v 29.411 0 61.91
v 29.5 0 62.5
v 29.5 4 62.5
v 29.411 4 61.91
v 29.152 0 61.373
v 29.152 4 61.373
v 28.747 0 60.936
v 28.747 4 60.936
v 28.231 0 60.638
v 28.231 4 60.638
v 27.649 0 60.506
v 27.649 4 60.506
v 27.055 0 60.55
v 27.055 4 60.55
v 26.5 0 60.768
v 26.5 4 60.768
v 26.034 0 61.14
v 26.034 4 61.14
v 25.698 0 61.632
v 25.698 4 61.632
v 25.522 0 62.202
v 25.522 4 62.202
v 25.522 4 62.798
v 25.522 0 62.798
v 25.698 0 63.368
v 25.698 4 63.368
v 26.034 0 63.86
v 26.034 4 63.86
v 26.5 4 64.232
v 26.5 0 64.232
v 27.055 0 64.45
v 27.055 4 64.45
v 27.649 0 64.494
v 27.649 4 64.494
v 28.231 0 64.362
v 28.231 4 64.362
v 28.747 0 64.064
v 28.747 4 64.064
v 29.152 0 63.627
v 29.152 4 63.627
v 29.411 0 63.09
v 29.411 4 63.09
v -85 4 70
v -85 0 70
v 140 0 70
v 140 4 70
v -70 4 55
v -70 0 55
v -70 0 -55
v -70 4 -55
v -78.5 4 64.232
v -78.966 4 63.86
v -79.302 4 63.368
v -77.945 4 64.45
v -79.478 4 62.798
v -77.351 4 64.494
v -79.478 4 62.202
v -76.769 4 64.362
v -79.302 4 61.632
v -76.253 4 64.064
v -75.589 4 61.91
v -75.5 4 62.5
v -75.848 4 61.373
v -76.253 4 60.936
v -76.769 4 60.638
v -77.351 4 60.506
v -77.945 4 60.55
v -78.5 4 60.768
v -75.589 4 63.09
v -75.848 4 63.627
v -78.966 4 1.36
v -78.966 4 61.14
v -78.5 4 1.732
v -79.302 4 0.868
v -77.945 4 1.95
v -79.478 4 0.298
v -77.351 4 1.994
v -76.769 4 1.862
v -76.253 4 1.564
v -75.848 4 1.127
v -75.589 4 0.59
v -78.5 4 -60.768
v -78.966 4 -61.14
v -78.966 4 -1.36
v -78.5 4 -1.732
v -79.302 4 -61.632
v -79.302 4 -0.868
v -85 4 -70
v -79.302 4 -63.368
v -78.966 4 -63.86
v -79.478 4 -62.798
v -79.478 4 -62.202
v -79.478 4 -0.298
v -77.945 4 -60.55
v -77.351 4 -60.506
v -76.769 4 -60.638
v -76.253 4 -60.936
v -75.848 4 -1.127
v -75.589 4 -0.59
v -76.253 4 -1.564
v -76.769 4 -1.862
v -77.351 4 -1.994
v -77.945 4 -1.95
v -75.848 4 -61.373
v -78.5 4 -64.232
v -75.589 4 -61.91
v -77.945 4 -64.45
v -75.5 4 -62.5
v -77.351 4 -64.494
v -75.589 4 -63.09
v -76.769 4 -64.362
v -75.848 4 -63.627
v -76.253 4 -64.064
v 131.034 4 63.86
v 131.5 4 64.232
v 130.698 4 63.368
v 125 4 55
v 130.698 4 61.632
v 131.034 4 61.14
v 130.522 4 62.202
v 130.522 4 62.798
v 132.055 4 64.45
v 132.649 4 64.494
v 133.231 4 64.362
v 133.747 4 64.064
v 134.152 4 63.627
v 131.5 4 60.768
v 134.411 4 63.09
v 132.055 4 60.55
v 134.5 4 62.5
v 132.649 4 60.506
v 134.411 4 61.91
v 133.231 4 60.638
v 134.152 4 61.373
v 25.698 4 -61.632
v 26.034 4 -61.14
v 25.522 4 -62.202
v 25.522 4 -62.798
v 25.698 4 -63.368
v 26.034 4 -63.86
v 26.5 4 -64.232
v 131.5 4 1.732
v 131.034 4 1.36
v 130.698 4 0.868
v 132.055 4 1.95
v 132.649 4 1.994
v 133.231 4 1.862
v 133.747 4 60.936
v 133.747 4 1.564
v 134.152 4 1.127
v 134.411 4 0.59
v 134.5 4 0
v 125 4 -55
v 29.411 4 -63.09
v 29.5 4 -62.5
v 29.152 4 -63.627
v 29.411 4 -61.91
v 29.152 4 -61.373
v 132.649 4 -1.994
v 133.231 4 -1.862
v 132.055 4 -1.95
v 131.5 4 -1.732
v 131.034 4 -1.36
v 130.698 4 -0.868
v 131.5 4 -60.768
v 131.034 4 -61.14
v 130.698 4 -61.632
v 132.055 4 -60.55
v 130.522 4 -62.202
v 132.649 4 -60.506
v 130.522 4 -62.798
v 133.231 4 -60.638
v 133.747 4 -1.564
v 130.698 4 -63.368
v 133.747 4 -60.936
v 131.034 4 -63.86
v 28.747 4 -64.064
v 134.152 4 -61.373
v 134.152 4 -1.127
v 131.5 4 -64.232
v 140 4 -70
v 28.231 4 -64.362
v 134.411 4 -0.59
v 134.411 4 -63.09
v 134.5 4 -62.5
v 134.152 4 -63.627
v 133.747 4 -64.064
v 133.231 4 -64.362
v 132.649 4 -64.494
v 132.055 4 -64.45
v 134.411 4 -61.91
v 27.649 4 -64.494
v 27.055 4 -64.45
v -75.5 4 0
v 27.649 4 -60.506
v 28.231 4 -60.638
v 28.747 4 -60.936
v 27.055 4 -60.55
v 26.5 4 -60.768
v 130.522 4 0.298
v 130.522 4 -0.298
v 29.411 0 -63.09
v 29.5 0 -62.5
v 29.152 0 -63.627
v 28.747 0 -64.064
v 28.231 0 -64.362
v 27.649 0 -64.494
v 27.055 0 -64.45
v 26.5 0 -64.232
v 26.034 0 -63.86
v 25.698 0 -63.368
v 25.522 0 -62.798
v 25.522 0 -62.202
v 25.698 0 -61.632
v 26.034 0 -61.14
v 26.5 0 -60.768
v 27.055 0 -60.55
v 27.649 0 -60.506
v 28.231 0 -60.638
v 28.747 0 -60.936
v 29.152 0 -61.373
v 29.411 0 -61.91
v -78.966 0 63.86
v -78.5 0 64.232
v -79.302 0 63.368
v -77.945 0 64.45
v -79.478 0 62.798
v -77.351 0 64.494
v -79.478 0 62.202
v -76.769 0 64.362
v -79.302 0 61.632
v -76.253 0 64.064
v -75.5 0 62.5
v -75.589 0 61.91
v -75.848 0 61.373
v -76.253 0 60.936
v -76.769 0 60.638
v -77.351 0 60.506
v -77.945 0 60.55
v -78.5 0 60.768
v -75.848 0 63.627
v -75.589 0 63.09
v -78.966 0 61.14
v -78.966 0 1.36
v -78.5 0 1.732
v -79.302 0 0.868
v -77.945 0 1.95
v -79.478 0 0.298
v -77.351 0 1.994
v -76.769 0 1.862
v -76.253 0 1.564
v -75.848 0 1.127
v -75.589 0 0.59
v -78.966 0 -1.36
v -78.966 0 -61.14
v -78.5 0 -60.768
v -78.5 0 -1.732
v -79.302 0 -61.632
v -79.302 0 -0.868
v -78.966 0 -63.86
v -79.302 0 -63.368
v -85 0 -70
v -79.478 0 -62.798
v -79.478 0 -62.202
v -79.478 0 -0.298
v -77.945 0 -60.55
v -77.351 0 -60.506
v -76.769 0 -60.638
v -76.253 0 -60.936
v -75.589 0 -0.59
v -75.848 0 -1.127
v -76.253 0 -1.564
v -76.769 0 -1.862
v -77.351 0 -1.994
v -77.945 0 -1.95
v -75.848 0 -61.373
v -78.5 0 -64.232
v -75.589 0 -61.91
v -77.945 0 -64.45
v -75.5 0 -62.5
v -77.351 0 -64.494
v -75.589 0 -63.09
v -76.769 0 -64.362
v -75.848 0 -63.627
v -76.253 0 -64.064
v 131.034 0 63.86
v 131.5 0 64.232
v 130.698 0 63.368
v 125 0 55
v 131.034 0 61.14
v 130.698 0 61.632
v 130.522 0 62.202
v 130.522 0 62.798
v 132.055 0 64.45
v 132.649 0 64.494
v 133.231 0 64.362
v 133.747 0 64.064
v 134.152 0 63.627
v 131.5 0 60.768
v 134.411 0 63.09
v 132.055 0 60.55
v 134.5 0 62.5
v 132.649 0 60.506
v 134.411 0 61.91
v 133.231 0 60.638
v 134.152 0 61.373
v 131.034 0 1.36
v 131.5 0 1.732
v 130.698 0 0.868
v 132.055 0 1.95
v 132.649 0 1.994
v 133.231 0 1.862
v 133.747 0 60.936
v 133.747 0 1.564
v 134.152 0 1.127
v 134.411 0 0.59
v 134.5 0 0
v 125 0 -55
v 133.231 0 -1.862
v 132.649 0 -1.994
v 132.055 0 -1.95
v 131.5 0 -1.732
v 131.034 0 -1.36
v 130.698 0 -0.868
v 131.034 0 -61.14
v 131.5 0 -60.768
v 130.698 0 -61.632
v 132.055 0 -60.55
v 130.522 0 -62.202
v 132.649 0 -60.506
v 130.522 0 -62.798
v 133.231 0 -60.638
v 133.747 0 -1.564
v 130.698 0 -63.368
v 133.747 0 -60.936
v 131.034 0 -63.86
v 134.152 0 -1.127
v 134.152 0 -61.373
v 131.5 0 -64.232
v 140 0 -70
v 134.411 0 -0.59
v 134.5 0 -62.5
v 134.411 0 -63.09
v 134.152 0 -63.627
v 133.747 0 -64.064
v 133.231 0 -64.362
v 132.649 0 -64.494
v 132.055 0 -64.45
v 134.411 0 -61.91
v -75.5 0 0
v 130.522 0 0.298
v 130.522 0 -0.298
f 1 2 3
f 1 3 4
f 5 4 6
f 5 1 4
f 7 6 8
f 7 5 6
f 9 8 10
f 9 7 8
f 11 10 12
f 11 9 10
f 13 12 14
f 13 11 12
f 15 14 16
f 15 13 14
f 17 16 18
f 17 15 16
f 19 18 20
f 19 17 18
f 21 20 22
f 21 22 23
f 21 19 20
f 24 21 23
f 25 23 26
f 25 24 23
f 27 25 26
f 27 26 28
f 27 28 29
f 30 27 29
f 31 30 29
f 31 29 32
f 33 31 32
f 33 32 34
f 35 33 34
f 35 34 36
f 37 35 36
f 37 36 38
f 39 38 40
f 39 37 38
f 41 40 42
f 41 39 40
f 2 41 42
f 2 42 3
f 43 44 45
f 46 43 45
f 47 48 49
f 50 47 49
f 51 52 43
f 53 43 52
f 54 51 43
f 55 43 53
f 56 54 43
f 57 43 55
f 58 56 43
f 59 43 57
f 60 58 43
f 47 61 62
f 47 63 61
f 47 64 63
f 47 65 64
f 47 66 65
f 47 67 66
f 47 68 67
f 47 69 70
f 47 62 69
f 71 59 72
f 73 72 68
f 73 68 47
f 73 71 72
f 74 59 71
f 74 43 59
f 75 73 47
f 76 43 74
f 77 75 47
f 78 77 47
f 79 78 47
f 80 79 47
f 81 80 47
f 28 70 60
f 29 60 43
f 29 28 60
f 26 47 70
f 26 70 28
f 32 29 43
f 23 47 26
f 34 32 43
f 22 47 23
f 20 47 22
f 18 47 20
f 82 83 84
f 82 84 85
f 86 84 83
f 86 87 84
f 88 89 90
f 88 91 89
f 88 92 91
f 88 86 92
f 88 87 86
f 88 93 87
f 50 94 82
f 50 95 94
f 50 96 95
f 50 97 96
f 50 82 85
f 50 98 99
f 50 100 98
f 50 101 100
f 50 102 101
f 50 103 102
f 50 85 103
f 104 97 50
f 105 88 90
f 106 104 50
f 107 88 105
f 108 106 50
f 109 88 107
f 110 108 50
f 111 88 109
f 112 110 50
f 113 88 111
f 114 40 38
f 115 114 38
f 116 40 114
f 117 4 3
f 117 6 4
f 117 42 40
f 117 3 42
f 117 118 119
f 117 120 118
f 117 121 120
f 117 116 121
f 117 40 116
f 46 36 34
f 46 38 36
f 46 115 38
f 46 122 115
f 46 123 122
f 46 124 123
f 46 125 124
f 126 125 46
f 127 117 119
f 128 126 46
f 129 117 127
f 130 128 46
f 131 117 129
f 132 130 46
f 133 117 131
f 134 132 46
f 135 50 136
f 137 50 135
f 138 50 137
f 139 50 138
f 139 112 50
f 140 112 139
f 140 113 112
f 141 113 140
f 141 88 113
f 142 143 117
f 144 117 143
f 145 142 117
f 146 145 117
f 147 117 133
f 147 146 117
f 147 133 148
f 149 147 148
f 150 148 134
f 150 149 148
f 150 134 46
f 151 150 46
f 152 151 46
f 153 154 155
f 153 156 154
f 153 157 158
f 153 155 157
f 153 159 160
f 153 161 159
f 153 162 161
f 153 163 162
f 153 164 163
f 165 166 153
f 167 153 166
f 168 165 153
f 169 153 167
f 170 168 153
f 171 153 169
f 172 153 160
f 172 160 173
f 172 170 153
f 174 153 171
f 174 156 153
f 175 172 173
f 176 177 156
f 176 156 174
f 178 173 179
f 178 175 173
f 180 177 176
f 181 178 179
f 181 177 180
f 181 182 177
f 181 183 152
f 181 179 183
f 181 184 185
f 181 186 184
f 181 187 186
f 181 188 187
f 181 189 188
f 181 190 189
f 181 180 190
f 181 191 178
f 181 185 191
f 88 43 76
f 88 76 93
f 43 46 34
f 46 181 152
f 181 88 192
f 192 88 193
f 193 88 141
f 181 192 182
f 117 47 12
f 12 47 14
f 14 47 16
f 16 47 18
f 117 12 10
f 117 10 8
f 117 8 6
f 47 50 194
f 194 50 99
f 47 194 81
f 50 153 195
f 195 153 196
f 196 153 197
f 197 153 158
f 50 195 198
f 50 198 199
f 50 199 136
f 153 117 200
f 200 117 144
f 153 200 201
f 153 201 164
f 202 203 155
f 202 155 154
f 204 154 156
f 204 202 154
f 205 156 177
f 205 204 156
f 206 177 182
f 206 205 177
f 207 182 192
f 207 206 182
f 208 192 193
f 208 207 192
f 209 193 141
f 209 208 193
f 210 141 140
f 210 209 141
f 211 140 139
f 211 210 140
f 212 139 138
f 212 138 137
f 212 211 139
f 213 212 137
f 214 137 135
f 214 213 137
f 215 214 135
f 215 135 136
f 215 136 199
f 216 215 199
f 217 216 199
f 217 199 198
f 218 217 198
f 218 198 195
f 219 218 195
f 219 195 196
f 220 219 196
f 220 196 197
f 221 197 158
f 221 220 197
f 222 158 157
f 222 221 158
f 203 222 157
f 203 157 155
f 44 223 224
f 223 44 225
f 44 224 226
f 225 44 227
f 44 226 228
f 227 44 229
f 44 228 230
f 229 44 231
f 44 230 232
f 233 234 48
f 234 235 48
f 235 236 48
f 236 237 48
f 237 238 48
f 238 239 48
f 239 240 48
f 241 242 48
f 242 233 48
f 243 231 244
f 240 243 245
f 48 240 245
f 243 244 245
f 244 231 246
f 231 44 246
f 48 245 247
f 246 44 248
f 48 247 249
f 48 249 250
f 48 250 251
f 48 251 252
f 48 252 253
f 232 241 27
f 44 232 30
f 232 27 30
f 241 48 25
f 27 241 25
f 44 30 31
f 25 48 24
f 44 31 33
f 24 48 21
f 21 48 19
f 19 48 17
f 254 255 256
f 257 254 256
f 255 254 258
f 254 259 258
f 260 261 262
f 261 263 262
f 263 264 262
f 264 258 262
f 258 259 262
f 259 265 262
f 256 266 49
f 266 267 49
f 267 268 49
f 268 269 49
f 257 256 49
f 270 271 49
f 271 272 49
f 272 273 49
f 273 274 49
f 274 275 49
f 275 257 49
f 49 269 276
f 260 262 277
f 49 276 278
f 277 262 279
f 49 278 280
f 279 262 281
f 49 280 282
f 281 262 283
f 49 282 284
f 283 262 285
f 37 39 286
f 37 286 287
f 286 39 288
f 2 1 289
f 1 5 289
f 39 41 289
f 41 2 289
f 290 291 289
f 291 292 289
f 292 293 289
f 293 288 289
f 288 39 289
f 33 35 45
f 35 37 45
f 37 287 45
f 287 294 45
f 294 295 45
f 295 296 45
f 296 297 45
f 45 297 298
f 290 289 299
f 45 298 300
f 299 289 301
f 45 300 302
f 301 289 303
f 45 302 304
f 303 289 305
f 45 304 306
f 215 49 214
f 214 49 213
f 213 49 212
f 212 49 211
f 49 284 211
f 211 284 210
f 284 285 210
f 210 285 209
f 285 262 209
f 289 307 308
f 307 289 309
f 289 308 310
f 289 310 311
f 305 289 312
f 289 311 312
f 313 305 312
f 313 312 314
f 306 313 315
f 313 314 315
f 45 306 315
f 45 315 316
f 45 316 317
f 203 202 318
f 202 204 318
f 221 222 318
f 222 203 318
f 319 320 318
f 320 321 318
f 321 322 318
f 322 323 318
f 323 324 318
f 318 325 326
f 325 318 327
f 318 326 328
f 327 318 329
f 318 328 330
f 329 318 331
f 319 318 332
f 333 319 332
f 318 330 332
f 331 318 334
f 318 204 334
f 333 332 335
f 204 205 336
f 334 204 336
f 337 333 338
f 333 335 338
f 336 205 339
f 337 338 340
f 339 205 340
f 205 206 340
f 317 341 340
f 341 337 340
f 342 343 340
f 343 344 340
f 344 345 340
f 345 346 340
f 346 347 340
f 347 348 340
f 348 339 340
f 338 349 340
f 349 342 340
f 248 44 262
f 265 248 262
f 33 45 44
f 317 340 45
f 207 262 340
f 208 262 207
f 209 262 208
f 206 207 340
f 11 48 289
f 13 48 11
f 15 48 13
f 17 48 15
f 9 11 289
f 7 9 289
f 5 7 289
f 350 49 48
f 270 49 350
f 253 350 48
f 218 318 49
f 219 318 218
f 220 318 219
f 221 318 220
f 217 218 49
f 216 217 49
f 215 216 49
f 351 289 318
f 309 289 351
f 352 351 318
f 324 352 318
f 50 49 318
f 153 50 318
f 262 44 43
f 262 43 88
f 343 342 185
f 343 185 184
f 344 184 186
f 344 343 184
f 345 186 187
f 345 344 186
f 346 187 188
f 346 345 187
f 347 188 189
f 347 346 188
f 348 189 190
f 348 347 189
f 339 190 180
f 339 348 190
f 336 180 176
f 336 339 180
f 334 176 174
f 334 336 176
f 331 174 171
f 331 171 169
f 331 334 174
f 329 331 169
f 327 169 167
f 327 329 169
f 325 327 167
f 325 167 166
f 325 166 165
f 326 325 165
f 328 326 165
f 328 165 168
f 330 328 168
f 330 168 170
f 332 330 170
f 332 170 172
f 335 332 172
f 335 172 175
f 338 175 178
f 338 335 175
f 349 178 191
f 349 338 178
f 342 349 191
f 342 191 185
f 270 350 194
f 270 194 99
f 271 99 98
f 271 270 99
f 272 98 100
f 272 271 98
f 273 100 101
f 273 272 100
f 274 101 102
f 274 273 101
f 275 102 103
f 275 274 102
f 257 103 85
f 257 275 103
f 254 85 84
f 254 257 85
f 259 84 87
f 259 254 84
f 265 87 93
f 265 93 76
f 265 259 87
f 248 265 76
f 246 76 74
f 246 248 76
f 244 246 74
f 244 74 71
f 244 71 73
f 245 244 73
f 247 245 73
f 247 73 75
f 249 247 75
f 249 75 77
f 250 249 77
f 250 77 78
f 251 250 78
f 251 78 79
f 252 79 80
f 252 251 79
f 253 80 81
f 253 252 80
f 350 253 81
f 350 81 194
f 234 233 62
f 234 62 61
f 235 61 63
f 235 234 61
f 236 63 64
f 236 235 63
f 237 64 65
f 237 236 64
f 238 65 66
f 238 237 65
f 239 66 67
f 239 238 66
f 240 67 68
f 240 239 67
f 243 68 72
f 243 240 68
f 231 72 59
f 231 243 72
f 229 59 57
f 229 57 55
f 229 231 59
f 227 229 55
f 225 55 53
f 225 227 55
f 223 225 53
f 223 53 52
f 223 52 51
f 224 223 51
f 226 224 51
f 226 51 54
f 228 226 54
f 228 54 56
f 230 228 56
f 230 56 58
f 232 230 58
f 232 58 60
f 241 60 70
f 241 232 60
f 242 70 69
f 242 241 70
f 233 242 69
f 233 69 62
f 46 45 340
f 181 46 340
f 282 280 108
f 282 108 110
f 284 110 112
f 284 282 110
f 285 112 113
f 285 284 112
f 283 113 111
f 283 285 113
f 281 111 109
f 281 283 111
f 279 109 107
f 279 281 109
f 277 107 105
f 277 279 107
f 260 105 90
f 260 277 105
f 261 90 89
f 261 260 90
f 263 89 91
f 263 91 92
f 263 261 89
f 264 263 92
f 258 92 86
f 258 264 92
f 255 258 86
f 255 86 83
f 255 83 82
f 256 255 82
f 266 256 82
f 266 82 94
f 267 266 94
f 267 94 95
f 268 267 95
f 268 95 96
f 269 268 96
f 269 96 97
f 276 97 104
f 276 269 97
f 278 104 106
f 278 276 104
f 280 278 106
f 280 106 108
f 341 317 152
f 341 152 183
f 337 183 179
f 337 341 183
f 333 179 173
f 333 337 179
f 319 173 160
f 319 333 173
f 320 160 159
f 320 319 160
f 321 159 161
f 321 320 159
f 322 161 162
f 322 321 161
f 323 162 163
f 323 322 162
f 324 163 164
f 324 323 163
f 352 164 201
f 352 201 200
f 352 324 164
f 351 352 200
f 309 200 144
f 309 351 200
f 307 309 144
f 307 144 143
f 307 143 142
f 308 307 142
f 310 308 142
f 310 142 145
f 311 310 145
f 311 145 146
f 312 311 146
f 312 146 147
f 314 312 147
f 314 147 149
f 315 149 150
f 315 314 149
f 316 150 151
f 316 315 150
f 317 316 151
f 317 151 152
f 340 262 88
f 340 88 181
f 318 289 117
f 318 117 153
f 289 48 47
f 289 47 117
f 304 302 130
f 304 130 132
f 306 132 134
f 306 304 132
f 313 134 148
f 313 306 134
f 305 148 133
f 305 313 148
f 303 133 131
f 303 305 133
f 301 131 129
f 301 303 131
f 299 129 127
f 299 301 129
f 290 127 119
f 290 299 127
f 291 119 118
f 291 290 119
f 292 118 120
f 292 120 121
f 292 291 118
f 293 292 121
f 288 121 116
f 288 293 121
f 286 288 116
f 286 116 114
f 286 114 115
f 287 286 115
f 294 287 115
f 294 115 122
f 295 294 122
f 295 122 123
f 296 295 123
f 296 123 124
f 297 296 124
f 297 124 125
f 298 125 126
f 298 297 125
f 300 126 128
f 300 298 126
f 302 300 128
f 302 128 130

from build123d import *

# Parameters (mm, degrees)
SKETCH1_W           = 225
SKETCH1_H           = 140
SKETCH1_R           = 2
SKETCH1_W_2         = 195
SKETCH1_H_2         = 110
BOSS_EXTRUDE1_DEPTH = 4


with BuildPart() as part:
    # Sketch1 → Boss-Extrude1 (new body)
    with BuildSketch(Plane(origin=(0, 0, 0), x_dir=(1, 0, 0), z_dir=(0, 1, 0))):
        with Locations((27.5, 0)):
            Rectangle(SKETCH1_W, SKETCH1_H)
        with Locations((-77.5, -62.5)):
            Circle(SKETCH1_R, mode=Mode.SUBTRACT)
        with Locations((-77.5, 62.5)):
            Circle(SKETCH1_R, mode=Mode.SUBTRACT)
        with Locations((132.5, 62.5)):
            Circle(SKETCH1_R, mode=Mode.SUBTRACT)
        with Locations((132.5, -62.5)):
            Circle(SKETCH1_R, mode=Mode.SUBTRACT)
        with Locations((27.5, -62.5)):
            Circle(SKETCH1_R, mode=Mode.SUBTRACT)
        with Locations((27.5, 62.5)):
            Circle(SKETCH1_R, mode=Mode.SUBTRACT)
        with Locations((-77.5, 0)):
            Circle(SKETCH1_R, mode=Mode.SUBTRACT)
        with Locations((132.5, 0)):
            Circle(SKETCH1_R, mode=Mode.SUBTRACT)
        with Locations((27.5, 0)):
            Rectangle(SKETCH1_W_2, SKETCH1_H_2, mode=Mode.SUBTRACT)
    extrude(amount=BOSS_EXTRUDE1_DEPTH)


solid = part.part
